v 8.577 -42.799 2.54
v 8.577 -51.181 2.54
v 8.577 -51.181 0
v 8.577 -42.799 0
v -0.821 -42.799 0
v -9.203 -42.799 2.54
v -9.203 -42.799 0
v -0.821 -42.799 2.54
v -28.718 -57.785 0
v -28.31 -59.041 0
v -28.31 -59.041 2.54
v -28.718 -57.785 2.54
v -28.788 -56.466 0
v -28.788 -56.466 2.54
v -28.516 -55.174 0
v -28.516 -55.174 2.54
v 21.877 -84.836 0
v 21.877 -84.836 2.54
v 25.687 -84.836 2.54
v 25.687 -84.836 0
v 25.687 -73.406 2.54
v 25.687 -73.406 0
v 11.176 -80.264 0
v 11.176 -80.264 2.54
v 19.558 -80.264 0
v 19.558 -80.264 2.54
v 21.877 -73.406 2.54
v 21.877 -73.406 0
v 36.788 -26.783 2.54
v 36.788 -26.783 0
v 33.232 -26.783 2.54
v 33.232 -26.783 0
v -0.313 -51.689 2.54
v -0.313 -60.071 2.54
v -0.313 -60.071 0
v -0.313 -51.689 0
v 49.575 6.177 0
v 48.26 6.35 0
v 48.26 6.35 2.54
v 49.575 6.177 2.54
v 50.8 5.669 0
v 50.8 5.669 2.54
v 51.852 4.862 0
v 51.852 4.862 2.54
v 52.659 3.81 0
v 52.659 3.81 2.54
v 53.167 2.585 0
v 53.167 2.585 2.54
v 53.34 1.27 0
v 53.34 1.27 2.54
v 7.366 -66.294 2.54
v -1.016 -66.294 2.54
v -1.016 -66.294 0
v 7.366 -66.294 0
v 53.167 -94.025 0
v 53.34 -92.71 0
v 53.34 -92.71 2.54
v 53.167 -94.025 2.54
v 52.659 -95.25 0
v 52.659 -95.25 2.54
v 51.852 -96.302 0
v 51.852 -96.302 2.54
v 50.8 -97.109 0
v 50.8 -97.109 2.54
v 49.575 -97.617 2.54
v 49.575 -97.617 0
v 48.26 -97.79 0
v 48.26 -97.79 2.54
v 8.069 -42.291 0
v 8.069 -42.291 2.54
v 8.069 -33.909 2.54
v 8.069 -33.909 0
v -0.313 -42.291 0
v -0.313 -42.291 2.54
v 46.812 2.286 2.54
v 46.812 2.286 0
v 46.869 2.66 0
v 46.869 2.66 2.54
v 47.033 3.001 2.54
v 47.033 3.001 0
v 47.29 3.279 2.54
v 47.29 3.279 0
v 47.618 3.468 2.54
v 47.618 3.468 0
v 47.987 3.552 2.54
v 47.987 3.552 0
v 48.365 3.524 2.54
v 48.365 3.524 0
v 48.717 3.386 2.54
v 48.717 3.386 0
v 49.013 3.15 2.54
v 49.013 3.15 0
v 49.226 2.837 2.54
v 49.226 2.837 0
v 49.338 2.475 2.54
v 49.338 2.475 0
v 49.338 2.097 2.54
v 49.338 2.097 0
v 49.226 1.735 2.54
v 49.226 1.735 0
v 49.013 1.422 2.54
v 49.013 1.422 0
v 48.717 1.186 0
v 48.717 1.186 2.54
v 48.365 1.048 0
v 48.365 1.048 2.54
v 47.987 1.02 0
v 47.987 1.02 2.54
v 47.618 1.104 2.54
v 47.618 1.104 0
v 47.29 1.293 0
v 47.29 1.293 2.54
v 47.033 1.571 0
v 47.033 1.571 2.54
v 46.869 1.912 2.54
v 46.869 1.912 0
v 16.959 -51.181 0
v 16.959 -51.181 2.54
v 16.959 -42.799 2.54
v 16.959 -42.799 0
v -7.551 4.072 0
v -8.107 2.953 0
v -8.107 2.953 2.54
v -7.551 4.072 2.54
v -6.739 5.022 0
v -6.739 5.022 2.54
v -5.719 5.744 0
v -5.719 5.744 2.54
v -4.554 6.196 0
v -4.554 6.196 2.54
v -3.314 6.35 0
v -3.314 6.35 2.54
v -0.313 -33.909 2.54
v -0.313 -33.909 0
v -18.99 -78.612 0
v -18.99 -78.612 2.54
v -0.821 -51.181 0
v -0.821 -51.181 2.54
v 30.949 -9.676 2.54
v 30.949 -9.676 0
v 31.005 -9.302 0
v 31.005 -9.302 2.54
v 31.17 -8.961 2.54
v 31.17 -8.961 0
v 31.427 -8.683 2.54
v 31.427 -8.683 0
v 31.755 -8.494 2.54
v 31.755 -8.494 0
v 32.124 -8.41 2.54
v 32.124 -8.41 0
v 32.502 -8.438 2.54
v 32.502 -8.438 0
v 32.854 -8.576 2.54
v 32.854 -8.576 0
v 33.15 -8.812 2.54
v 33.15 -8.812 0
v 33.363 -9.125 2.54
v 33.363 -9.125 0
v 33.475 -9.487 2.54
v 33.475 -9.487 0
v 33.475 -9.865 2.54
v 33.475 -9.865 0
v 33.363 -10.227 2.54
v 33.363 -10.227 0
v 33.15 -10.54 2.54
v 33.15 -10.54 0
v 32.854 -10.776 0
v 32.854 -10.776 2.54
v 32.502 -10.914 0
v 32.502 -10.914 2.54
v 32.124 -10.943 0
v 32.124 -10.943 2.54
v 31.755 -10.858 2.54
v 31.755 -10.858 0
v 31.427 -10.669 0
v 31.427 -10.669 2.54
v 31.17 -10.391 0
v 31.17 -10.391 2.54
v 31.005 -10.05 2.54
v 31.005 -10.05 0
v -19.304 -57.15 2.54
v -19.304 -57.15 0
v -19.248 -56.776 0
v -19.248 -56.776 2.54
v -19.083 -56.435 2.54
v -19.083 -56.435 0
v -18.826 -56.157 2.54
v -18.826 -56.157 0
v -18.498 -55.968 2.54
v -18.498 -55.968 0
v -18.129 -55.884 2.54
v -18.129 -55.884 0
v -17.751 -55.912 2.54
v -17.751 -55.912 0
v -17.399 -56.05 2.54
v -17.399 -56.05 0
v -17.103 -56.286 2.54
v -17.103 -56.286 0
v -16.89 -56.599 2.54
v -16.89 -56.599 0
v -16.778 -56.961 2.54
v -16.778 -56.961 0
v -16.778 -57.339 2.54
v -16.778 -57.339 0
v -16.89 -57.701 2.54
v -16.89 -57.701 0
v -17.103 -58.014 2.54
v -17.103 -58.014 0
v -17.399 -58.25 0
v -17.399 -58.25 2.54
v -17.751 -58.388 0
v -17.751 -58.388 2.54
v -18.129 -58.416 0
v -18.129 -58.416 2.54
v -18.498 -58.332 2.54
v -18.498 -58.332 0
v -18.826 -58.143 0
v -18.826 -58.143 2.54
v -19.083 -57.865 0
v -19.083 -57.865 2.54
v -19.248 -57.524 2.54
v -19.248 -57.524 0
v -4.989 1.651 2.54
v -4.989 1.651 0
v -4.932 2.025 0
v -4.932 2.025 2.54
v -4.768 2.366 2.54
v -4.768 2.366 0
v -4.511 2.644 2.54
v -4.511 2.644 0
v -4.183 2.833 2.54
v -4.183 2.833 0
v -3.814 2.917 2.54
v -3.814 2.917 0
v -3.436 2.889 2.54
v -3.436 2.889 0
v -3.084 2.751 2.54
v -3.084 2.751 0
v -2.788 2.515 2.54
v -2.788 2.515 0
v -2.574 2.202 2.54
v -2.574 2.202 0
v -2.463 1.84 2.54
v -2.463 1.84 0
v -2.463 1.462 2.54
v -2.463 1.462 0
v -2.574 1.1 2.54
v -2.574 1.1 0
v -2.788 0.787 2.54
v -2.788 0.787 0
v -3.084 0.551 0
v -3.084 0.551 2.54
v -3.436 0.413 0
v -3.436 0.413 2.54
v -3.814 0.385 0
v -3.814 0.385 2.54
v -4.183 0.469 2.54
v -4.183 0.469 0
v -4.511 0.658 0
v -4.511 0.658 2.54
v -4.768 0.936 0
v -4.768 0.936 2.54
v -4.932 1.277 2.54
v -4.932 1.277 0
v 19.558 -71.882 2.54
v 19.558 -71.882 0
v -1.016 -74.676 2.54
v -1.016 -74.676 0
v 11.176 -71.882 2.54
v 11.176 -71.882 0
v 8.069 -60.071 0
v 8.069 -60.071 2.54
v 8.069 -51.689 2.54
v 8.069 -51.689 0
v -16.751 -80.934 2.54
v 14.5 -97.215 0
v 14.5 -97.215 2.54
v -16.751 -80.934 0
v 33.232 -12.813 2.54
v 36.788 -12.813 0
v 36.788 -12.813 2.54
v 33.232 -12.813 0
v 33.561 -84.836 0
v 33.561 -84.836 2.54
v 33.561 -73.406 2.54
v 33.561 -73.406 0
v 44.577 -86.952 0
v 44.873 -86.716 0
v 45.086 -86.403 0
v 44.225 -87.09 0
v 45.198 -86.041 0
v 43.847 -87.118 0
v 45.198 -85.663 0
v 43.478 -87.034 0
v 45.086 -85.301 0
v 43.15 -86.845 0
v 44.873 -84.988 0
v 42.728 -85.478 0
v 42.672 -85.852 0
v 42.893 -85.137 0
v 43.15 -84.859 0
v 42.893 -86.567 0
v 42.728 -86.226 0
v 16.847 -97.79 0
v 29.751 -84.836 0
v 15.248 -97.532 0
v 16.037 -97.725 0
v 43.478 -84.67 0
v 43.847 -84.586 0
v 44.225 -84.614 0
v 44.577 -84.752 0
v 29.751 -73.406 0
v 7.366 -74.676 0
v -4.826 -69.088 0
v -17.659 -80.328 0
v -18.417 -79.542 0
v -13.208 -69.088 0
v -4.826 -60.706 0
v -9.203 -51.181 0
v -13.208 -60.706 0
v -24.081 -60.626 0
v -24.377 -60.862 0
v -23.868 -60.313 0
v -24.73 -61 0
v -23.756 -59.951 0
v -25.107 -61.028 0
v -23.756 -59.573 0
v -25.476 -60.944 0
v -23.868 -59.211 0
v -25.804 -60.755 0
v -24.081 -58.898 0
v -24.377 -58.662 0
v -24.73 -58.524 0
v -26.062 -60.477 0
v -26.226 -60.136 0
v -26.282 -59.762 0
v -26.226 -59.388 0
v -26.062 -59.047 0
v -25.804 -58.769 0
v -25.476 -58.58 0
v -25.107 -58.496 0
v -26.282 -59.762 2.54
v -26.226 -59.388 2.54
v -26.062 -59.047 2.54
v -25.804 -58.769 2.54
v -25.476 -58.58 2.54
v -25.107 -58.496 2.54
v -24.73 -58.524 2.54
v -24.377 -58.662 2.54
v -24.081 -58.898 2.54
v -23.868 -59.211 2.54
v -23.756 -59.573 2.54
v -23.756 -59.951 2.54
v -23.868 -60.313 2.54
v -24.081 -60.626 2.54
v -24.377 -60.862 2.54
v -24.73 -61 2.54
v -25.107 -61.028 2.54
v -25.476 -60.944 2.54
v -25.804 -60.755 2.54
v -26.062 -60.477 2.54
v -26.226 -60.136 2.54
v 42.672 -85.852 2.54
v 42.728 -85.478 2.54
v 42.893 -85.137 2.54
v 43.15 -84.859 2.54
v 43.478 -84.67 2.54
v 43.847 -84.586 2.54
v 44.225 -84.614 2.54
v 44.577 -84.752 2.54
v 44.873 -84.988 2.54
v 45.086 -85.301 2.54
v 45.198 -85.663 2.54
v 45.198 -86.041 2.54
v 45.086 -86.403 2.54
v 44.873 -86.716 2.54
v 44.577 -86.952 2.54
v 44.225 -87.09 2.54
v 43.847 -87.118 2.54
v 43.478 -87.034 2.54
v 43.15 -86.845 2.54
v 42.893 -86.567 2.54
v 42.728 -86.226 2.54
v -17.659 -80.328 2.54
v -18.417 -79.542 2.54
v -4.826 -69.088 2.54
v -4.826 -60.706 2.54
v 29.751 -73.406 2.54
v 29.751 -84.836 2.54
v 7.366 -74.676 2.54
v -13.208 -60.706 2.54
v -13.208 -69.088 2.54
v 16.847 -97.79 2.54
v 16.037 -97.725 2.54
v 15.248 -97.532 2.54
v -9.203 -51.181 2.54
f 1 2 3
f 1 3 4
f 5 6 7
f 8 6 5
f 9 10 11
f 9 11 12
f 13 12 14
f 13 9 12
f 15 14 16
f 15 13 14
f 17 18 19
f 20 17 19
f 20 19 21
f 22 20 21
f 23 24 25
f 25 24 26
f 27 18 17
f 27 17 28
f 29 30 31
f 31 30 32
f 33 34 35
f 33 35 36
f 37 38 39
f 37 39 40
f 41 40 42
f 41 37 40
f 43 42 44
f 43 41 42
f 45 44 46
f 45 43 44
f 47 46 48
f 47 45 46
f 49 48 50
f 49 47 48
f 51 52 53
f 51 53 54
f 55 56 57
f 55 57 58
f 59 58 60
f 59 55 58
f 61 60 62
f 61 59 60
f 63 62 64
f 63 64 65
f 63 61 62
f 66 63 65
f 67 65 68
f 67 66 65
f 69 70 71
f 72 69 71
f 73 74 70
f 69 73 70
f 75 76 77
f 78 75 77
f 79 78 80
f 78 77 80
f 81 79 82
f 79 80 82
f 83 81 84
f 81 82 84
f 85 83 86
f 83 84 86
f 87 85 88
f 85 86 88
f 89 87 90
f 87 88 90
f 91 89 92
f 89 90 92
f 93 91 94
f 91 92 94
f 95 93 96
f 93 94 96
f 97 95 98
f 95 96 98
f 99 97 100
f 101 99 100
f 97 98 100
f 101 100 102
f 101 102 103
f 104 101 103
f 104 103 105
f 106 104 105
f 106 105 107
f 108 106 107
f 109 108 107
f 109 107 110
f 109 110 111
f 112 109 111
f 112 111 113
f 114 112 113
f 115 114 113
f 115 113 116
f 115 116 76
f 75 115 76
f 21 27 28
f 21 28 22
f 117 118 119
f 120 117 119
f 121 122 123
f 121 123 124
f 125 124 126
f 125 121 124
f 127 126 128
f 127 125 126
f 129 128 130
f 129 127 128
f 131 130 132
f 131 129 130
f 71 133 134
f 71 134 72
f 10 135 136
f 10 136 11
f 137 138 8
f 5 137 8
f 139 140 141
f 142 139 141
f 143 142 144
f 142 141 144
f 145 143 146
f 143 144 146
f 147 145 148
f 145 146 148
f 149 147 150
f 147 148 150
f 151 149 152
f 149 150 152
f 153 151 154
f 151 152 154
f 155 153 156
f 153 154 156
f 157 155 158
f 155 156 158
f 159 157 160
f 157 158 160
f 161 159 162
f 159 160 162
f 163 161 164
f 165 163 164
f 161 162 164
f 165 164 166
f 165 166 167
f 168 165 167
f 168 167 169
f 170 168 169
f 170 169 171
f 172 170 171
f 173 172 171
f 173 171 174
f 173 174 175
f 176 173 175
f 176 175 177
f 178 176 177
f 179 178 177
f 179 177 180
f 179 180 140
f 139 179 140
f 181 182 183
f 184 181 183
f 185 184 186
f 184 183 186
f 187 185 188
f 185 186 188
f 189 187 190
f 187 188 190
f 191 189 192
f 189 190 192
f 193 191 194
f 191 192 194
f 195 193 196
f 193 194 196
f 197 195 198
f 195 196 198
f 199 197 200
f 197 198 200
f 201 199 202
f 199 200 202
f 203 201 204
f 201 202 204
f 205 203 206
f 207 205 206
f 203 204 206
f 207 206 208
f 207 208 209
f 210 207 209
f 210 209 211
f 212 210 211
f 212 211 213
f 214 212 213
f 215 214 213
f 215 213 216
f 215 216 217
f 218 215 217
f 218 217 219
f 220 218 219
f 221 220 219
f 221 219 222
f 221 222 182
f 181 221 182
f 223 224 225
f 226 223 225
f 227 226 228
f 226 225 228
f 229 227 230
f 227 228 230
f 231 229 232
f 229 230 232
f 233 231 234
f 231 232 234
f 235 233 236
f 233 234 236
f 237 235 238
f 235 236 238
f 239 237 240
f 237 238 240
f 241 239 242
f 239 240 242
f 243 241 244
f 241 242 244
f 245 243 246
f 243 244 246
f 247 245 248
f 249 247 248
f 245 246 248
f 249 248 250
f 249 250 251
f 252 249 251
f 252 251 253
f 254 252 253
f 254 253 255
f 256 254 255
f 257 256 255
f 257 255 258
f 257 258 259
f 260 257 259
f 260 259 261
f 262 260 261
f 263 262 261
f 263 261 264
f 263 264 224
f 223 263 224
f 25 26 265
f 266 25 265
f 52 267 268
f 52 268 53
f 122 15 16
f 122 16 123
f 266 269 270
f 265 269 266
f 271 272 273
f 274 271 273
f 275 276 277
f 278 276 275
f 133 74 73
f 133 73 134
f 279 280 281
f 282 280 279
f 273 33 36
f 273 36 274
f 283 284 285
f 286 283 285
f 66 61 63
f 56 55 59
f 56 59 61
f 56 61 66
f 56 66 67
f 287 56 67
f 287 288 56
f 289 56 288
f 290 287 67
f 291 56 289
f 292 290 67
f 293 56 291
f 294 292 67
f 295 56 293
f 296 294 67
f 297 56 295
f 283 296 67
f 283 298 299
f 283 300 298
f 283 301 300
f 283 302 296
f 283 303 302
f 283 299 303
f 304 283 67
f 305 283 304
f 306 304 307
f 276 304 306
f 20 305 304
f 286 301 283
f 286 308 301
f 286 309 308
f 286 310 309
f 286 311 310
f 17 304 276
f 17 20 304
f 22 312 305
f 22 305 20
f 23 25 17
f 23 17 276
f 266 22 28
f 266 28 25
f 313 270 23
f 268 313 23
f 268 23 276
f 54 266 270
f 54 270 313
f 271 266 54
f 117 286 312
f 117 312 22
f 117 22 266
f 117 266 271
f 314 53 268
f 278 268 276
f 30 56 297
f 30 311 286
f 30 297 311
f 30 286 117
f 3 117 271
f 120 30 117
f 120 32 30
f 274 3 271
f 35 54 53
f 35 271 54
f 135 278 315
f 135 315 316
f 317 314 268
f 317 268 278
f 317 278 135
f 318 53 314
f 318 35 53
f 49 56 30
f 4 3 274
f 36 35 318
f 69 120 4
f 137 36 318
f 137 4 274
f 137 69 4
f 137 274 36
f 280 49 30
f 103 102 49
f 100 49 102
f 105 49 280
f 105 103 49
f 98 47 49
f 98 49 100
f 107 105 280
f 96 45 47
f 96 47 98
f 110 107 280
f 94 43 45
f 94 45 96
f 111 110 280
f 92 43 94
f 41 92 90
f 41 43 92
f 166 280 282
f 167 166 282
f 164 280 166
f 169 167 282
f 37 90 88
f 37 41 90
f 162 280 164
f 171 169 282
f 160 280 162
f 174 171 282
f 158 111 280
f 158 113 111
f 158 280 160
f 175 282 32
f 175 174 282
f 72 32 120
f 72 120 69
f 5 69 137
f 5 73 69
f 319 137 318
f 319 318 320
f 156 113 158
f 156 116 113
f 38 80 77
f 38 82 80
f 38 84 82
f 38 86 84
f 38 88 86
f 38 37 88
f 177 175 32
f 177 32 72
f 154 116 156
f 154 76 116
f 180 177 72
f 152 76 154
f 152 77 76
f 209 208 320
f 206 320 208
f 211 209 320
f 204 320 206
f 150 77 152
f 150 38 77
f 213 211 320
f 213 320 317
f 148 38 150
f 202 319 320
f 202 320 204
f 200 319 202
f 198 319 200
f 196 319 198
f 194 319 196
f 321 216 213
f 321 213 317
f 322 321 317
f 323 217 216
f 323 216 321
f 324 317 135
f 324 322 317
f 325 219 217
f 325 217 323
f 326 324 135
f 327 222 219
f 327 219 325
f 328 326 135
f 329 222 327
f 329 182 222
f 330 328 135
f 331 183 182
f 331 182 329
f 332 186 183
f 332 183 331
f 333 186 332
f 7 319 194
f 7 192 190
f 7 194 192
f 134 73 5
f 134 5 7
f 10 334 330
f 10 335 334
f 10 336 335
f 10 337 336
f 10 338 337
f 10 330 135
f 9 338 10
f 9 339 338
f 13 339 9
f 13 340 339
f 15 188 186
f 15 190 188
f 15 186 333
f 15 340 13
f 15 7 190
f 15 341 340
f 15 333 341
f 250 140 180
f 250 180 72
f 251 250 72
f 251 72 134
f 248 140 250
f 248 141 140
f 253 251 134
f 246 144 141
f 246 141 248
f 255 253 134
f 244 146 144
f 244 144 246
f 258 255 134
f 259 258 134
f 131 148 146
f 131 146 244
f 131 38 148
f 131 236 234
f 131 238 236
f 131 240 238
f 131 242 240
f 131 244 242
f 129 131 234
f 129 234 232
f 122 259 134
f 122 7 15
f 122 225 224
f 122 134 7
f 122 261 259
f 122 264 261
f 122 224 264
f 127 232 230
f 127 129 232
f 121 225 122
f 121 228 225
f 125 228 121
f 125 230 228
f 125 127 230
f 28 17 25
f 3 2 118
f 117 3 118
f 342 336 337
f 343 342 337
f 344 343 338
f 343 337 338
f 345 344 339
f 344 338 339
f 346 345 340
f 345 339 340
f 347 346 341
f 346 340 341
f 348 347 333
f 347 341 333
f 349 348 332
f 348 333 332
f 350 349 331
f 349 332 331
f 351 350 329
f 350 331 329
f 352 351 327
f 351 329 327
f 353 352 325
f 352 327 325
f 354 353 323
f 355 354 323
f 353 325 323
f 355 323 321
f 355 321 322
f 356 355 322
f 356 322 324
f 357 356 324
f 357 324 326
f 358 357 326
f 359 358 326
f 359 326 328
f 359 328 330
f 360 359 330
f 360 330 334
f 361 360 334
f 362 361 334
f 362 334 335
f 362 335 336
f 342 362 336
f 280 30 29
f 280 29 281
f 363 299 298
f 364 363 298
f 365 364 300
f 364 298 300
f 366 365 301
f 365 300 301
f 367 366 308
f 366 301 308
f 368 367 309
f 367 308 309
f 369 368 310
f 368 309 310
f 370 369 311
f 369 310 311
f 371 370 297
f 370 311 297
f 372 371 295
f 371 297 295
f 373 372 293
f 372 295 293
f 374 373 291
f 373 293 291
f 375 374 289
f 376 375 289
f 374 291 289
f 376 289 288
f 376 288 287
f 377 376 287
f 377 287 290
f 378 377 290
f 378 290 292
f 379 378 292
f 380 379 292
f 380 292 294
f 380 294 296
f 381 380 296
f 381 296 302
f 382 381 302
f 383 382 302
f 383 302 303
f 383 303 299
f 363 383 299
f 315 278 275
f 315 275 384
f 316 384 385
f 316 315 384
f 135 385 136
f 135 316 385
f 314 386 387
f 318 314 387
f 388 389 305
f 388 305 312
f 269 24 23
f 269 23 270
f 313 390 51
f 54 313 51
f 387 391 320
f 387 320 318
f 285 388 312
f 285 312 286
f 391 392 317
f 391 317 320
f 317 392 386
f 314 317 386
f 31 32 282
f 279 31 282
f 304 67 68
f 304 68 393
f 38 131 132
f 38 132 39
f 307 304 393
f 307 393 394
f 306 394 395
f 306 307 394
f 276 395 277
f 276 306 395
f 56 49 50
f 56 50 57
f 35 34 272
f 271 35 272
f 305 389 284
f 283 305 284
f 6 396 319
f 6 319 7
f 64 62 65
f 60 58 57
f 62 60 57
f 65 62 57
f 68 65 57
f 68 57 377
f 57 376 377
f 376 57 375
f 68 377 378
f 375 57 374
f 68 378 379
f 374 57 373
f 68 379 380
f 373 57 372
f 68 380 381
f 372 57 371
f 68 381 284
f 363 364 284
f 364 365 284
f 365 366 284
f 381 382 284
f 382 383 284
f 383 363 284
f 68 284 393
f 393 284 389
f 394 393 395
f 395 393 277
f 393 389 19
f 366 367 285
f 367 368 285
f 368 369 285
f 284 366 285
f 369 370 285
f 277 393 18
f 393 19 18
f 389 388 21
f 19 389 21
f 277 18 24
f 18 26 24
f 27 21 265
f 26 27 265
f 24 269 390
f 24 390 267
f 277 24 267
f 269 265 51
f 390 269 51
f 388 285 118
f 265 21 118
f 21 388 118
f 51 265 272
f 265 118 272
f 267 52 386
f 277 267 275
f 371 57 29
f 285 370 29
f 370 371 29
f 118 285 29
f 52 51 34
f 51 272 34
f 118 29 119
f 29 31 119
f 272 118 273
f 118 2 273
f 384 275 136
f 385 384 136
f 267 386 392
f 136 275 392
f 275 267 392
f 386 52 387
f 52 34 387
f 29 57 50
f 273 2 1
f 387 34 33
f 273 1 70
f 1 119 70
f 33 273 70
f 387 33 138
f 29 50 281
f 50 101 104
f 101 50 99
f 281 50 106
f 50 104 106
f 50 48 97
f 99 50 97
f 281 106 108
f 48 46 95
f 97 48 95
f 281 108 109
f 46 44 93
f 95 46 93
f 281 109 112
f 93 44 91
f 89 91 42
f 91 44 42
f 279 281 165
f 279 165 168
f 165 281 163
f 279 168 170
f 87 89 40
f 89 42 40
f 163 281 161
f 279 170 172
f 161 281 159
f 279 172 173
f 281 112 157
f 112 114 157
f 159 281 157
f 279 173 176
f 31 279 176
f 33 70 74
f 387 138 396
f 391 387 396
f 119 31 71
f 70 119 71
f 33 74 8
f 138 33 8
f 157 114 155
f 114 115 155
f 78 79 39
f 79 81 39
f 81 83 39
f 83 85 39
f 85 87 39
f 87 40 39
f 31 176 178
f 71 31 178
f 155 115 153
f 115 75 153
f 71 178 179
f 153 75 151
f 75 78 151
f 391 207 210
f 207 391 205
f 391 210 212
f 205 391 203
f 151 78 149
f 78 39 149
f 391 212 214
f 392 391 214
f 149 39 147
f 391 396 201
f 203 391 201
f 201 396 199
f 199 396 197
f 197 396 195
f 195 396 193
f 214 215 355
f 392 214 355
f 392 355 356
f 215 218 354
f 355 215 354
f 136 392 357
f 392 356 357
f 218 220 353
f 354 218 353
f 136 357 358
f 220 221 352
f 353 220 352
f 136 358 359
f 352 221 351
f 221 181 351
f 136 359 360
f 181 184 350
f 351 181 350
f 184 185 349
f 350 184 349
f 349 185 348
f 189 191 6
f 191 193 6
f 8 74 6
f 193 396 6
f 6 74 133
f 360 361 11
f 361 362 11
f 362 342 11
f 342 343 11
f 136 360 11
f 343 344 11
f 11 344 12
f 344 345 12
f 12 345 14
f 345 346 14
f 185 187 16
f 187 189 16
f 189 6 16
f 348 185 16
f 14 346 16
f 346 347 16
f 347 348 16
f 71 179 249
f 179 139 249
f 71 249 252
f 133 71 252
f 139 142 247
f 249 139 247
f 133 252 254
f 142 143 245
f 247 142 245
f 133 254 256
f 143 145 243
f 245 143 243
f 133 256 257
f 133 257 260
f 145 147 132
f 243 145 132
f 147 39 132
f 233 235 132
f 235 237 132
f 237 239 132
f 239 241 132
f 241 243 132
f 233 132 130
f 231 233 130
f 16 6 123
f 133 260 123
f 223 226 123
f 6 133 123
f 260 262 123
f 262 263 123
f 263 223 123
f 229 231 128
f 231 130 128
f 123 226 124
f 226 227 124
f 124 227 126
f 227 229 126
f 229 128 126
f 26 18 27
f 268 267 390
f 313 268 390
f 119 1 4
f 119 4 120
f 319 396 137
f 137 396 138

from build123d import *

# Parameters (mm, degrees)
BOSS_EXTRUDE1_DEPTH     = 2.54
SKETCH11_W              = 3.81
SKETCH11_H              = 11.43
SKETCH11_W_2            = 8.382
SKETCH11_H_2            = 8.382
CUT_EXTRUDE1_DEPTH      = 1
CUT_EXTRUDE1_DEPTH_BACK = 3.54
SKETCH12_R              = 1.27
CUT_EXTRUDE2_DEPTH      = 1
CUT_EXTRUDE2_DEPTH_BACK = 3.54
SKETCH13_R              = 1.27
CUT_EXTRUDE3_DEPTH      = 1
CUT_EXTRUDE3_DEPTH_BACK = 3.54
SKETCH14_W              = 3.556
SKETCH14_H              = 13.97
CUT_EXTRUDE4_DEPTH      = 1
CUT_EXTRUDE4_DEPTH_BACK = 3.54
SKETCH16_R              = 1.27
CUT_EXTRUDE5_DEPTH      = 1
CUT_EXTRUDE5_DEPTH_BACK = 3.54


with BuildPart() as part:
    # Sketch10 → Boss-Extrude1 (new body)
    with BuildSketch(Plane.XY):
        with BuildLine():
            Line((53.34, 1.27), (53.34, -92.71))
            ThreePointArc((53.34, -92.71), (51.852102448, -96.302102448), (48.26, -97.79))
            Line((48.26, -97.79), (16.846989059, -97.79))
            ThreePointArc((16.846989059, -97.79), (15.638688158, -97.644208035), (14.499741809, -97.215200367))
            Line((14.499741809, -97.215200367), (-16.7505185, -80.933552139))
            ThreePointArc((-16.7505185, -80.933552139), (-18.059258376, -79.955412607), (-18.989802686, -78.61241436))
            Line((-18.989802686, -78.61241436), (-28.309569459, -59.040904135))
            ThreePointArc((-28.309569459, -59.040904135), (-28.795802898, -57.127870198), (-28.51617555, -55.173917704))
            Line((-28.51617555, -55.173917704), (-8.107195629, 2.952923842))
            ThreePointArc((-8.107195629, 2.952923842), (-6.251501454, 5.414614163), (-3.314058103, 6.35))
            Line((-3.314058103, 6.35), (48.26, 6.35))
            ThreePointArc((48.26, 6.35), (51.852102448, 4.862102448), (53.34, 1.27))
        make_face()
    extrude(amount=BOSS_EXTRUDE1_DEPTH)

    # Sketch11 → Cut-Extrude1 (cut, two sides)
    with BuildSketch(Plane.XY.offset(2.54)) as cut_extrude1_sk:
        with Locations((31.65602, -79.121)):
            Rectangle(SKETCH11_W, SKETCH11_H)
        with Locations((23.78202, -79.121)):
            Rectangle(SKETCH11_W, SKETCH11_H)
        with Locations((3.878385852, -55.88)):
            Rectangle(SKETCH11_W_2, SKETCH11_H_2)
        with Locations((-5.011614148, -46.99)):
            Rectangle(SKETCH11_W_2, SKETCH11_H_2)
        with Locations((3.878385852, -38.1)):
            Rectangle(SKETCH11_W_2, SKETCH11_H_2)
        with Locations((12.768385852, -46.99)):
            Rectangle(SKETCH11_W_2, SKETCH11_H_2)
        with Locations((-9.017, -64.897)):
            Rectangle(SKETCH11_W_2, SKETCH11_H_2)
        with Locations((3.175, -70.485)):
            Rectangle(SKETCH11_W_2, SKETCH11_H_2)
        with Locations((15.367, -76.073)):
            Rectangle(SKETCH11_W_2, SKETCH11_H_2)
    extrude(amount=CUT_EXTRUDE1_DEPTH, mode=Mode.SUBTRACT)
    extrude(cut_extrude1_sk.sketch, amount=-CUT_EXTRUDE1_DEPTH_BACK, mode=Mode.SUBTRACT)

    # Sketch12 → Cut-Extrude2 (cut, two sides)
    with BuildSketch(Plane(origin=(0, 0, 0), x_dir=(-1, 0, 0), z_dir=(0, 0, -1))) as cut_extrude2_sk:
        with Locations((18.034, -57.15)):
            Circle(SKETCH12_R)
        with Locations((-43.942, -85.852)):
            Circle(SKETCH12_R)
    extrude(amount=CUT_EXTRUDE2_DEPTH, mode=Mode.SUBTRACT)
    extrude(cut_extrude2_sk.sketch, amount=-CUT_EXTRUDE2_DEPTH_BACK, mode=Mode.SUBTRACT)

    # Sketch13 → Cut-Extrude3 (cut, two sides)
    with BuildSketch(Plane(origin=(0, 0, 0), x_dir=(-1, 0, 0), z_dir=(0, 0, -1))) as cut_extrude3_sk:
        with Locations((25.012261453, -59.761967182)):
            Circle(SKETCH13_R)
        with Locations((-48.0822, 2.286)):
            Circle(SKETCH13_R)
        with Locations((3.718687848, 1.651)):
            Circle(SKETCH13_R)
    extrude(amount=CUT_EXTRUDE3_DEPTH, mode=Mode.SUBTRACT)
    extrude(cut_extrude3_sk.sketch, amount=-CUT_EXTRUDE3_DEPTH_BACK, mode=Mode.SUBTRACT)

    # Sketch14 → Cut-Extrude4 (cut, two sides)
    with BuildSketch(Plane(origin=(0, 0, 0), x_dir=(-1, 0, 0), z_dir=(0, 0, -1))) as cut_extrude4_sk:
        with Locations((-35.010498686, -19.798068862)):
            Rectangle(SKETCH14_W, SKETCH14_H)
    extrude(amount=CUT_EXTRUDE4_DEPTH, mode=Mode.SUBTRACT)
    extrude(cut_extrude4_sk.sketch, amount=-CUT_EXTRUDE4_DEPTH_BACK, mode=Mode.SUBTRACT)

    # Sketch16 → Cut-Extrude5 (cut, two sides)
    with BuildSketch(Plane(origin=(0, 0, 0), x_dir=(-1, 0, 0), z_dir=(0, 0, -1))) as cut_extrude5_sk:
        with Locations((-32.21898687, -9.676053038)):
            Circle(SKETCH16_R)
    extrude(amount=CUT_EXTRUDE5_DEPTH, mode=Mode.SUBTRACT)
    extrude(cut_extrude5_sk.sketch, amount=-CUT_EXTRUDE5_DEPTH_BACK, mode=Mode.SUBTRACT)


solid = part.part
